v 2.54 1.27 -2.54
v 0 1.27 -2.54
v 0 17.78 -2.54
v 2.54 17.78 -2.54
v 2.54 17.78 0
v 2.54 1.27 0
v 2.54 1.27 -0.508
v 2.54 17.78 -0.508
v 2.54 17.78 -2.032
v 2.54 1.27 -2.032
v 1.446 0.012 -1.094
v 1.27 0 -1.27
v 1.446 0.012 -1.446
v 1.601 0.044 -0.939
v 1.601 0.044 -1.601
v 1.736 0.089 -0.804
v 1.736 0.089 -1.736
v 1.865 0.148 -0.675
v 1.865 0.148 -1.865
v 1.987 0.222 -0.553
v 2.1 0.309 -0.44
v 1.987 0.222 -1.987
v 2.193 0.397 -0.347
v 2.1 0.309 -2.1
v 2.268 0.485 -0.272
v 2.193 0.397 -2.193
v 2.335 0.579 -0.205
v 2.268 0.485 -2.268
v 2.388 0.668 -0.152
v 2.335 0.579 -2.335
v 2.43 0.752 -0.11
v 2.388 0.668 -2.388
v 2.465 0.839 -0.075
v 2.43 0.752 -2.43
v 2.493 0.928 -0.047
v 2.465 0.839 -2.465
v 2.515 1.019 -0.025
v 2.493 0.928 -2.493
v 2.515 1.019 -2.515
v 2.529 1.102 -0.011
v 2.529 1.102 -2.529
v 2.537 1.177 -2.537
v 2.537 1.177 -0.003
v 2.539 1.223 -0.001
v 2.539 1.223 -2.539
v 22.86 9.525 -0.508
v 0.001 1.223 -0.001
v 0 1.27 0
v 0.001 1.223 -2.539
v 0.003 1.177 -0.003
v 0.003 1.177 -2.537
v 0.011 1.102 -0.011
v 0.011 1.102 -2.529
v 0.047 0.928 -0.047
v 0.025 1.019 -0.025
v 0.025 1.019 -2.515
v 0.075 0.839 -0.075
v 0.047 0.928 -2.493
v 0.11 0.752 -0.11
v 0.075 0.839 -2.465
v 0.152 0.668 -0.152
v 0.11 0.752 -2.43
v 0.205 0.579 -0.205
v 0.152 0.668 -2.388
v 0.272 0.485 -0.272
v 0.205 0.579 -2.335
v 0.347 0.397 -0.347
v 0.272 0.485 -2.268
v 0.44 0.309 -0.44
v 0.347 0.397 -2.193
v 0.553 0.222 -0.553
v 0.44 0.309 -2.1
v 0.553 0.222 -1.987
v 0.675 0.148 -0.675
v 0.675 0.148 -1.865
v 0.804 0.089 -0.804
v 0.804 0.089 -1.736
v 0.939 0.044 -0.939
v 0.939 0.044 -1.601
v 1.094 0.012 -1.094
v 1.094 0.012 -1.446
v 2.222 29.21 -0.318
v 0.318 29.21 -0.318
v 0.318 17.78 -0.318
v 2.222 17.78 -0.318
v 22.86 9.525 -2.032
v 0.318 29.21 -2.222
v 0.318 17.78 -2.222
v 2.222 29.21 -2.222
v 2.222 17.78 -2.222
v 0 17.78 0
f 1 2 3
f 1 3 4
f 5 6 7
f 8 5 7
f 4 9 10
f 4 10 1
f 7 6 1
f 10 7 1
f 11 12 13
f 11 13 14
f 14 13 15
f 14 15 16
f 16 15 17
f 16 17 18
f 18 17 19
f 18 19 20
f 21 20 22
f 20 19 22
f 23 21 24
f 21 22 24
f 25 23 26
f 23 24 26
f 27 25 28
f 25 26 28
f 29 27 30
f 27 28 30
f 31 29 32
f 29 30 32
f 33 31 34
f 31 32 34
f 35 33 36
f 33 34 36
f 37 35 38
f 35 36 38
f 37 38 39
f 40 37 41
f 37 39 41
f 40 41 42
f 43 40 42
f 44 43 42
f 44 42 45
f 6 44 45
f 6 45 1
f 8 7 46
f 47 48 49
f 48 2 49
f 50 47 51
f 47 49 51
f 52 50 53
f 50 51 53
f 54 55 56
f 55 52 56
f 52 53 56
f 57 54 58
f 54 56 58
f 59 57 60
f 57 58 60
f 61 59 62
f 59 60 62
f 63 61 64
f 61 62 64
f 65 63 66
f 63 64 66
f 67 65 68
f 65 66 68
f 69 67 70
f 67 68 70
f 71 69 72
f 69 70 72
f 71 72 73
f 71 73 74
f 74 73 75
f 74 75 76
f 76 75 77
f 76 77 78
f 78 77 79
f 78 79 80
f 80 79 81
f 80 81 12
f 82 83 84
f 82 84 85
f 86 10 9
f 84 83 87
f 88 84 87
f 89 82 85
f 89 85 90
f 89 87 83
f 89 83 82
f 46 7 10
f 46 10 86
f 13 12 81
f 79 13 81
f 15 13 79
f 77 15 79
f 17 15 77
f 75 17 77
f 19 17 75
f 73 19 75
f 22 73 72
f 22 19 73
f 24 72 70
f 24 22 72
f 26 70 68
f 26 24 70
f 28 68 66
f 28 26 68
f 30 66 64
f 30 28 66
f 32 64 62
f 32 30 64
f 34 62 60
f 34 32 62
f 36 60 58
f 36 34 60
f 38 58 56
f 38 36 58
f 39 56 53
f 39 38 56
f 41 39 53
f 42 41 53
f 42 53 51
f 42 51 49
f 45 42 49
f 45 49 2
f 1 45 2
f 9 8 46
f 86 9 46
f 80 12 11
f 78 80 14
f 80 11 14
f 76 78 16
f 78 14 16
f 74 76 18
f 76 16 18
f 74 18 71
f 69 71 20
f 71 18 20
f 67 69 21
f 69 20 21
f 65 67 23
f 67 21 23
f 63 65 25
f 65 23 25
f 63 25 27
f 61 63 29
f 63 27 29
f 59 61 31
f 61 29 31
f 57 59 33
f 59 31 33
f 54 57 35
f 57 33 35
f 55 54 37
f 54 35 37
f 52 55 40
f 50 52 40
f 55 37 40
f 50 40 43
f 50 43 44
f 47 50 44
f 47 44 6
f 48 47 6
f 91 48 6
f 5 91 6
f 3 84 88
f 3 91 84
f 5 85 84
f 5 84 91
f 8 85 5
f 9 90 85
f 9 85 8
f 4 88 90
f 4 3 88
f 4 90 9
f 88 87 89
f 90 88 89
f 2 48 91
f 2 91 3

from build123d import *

# Parameters (mm, degrees)
SKETCH1_W           = 2.54
SKETCH1_H           = 2.54
BOSS_EXTRUDE1_DEPTH = 29.21
SKETCH2_OUTSIDE_W   = 10.426
SKETCH2_OUTSIDE_H   = 10.426
SKETCH2_OUTSIDE_W_2 = 1.905
SKETCH2_OUTSIDE_H_2 = 1.905
CUT_EXTRUDE1_DEPTH  = 11.43
FILLET1_R           = 1.27
SKETCH3_W           = 1.524
SKETCH3_H           = 16.51
BOSS_EXTRUDE2_DEPTH = 20.32
CUT_EXTRUDE2_DEPTH  = 38.147445726
CUT_EXTRUDE3_DEPTH  = 38.147445726


with BuildPart() as part:
    # Sketch1 → Boss-Extrude1 (new body)
    with BuildSketch(Plane(origin=(0, 0, 0), x_dir=(1, 0, 0), z_dir=(0, 1, 0))):
        with Locations((1.27, 1.27)):
            Rectangle(SKETCH1_W, SKETCH1_H)
    extrude(amount=BOSS_EXTRUDE1_DEPTH)

    # Sketch2 outside → Cut-Extrude1 (cut)
    with BuildSketch(Plane(origin=(0, 29.21, 0), x_dir=(1, 0, 0), z_dir=(0, 1, 0))):
        with Locations((1.27, 1.27)):
            Rectangle(SKETCH2_OUTSIDE_W, SKETCH2_OUTSIDE_H)
        with Locations((1.27, 1.27)):
            Rectangle(SKETCH2_OUTSIDE_W_2, SKETCH2_OUTSIDE_H_2, mode=Mode.SUBTRACT)
    extrude(amount=-CUT_EXTRUDE1_DEPTH, mode=Mode.SUBTRACT)

    # Fillet1
    fillet1_edges = [part.edges().sort_by_distance(p)[0] for p in [
        (1.27, 0, -2.54),
        (2.54, 0, -1.27),
        (1.27, 0, 0),
        (0, 0, -1.27),
    ]]
    fillet(fillet1_edges, radius=FILLET1_R - 0.0001)  # a hair under: the kernel refuses the full size

    # Sketch3 → Boss-Extrude2 (add)
    with BuildSketch(Plane(origin=(2.54, 0, 0), x_dir=(0, 0, -1), z_dir=(1, 0, 0))):
        with Locations((1.27, 9.525)):
            Rectangle(SKETCH3_W, SKETCH3_H)
    extrude(amount=BOSS_EXTRUDE2_DEPTH)

    # Sketch4 → Cut-Extrude2 (cut, through all)
    with BuildSketch(Plane.XY.offset(-0.508)):
        Polygon((2.54, 17.78), (22.86, 9.525), (22.86, 17.78), align=None)
    extrude(amount=-CUT_EXTRUDE2_DEPTH, mode=Mode.SUBTRACT)

    # Sketch5 → Cut-Extrude3 (cut, through all)
    with BuildSketch(Plane.XY.offset(-0.508)):
        Polygon((2.54, 1.27), (22.86, 9.525), (22.86, 1.27), align=None)
    extrude(amount=-CUT_EXTRUDE3_DEPTH, mode=Mode.SUBTRACT)


solid = part.part
